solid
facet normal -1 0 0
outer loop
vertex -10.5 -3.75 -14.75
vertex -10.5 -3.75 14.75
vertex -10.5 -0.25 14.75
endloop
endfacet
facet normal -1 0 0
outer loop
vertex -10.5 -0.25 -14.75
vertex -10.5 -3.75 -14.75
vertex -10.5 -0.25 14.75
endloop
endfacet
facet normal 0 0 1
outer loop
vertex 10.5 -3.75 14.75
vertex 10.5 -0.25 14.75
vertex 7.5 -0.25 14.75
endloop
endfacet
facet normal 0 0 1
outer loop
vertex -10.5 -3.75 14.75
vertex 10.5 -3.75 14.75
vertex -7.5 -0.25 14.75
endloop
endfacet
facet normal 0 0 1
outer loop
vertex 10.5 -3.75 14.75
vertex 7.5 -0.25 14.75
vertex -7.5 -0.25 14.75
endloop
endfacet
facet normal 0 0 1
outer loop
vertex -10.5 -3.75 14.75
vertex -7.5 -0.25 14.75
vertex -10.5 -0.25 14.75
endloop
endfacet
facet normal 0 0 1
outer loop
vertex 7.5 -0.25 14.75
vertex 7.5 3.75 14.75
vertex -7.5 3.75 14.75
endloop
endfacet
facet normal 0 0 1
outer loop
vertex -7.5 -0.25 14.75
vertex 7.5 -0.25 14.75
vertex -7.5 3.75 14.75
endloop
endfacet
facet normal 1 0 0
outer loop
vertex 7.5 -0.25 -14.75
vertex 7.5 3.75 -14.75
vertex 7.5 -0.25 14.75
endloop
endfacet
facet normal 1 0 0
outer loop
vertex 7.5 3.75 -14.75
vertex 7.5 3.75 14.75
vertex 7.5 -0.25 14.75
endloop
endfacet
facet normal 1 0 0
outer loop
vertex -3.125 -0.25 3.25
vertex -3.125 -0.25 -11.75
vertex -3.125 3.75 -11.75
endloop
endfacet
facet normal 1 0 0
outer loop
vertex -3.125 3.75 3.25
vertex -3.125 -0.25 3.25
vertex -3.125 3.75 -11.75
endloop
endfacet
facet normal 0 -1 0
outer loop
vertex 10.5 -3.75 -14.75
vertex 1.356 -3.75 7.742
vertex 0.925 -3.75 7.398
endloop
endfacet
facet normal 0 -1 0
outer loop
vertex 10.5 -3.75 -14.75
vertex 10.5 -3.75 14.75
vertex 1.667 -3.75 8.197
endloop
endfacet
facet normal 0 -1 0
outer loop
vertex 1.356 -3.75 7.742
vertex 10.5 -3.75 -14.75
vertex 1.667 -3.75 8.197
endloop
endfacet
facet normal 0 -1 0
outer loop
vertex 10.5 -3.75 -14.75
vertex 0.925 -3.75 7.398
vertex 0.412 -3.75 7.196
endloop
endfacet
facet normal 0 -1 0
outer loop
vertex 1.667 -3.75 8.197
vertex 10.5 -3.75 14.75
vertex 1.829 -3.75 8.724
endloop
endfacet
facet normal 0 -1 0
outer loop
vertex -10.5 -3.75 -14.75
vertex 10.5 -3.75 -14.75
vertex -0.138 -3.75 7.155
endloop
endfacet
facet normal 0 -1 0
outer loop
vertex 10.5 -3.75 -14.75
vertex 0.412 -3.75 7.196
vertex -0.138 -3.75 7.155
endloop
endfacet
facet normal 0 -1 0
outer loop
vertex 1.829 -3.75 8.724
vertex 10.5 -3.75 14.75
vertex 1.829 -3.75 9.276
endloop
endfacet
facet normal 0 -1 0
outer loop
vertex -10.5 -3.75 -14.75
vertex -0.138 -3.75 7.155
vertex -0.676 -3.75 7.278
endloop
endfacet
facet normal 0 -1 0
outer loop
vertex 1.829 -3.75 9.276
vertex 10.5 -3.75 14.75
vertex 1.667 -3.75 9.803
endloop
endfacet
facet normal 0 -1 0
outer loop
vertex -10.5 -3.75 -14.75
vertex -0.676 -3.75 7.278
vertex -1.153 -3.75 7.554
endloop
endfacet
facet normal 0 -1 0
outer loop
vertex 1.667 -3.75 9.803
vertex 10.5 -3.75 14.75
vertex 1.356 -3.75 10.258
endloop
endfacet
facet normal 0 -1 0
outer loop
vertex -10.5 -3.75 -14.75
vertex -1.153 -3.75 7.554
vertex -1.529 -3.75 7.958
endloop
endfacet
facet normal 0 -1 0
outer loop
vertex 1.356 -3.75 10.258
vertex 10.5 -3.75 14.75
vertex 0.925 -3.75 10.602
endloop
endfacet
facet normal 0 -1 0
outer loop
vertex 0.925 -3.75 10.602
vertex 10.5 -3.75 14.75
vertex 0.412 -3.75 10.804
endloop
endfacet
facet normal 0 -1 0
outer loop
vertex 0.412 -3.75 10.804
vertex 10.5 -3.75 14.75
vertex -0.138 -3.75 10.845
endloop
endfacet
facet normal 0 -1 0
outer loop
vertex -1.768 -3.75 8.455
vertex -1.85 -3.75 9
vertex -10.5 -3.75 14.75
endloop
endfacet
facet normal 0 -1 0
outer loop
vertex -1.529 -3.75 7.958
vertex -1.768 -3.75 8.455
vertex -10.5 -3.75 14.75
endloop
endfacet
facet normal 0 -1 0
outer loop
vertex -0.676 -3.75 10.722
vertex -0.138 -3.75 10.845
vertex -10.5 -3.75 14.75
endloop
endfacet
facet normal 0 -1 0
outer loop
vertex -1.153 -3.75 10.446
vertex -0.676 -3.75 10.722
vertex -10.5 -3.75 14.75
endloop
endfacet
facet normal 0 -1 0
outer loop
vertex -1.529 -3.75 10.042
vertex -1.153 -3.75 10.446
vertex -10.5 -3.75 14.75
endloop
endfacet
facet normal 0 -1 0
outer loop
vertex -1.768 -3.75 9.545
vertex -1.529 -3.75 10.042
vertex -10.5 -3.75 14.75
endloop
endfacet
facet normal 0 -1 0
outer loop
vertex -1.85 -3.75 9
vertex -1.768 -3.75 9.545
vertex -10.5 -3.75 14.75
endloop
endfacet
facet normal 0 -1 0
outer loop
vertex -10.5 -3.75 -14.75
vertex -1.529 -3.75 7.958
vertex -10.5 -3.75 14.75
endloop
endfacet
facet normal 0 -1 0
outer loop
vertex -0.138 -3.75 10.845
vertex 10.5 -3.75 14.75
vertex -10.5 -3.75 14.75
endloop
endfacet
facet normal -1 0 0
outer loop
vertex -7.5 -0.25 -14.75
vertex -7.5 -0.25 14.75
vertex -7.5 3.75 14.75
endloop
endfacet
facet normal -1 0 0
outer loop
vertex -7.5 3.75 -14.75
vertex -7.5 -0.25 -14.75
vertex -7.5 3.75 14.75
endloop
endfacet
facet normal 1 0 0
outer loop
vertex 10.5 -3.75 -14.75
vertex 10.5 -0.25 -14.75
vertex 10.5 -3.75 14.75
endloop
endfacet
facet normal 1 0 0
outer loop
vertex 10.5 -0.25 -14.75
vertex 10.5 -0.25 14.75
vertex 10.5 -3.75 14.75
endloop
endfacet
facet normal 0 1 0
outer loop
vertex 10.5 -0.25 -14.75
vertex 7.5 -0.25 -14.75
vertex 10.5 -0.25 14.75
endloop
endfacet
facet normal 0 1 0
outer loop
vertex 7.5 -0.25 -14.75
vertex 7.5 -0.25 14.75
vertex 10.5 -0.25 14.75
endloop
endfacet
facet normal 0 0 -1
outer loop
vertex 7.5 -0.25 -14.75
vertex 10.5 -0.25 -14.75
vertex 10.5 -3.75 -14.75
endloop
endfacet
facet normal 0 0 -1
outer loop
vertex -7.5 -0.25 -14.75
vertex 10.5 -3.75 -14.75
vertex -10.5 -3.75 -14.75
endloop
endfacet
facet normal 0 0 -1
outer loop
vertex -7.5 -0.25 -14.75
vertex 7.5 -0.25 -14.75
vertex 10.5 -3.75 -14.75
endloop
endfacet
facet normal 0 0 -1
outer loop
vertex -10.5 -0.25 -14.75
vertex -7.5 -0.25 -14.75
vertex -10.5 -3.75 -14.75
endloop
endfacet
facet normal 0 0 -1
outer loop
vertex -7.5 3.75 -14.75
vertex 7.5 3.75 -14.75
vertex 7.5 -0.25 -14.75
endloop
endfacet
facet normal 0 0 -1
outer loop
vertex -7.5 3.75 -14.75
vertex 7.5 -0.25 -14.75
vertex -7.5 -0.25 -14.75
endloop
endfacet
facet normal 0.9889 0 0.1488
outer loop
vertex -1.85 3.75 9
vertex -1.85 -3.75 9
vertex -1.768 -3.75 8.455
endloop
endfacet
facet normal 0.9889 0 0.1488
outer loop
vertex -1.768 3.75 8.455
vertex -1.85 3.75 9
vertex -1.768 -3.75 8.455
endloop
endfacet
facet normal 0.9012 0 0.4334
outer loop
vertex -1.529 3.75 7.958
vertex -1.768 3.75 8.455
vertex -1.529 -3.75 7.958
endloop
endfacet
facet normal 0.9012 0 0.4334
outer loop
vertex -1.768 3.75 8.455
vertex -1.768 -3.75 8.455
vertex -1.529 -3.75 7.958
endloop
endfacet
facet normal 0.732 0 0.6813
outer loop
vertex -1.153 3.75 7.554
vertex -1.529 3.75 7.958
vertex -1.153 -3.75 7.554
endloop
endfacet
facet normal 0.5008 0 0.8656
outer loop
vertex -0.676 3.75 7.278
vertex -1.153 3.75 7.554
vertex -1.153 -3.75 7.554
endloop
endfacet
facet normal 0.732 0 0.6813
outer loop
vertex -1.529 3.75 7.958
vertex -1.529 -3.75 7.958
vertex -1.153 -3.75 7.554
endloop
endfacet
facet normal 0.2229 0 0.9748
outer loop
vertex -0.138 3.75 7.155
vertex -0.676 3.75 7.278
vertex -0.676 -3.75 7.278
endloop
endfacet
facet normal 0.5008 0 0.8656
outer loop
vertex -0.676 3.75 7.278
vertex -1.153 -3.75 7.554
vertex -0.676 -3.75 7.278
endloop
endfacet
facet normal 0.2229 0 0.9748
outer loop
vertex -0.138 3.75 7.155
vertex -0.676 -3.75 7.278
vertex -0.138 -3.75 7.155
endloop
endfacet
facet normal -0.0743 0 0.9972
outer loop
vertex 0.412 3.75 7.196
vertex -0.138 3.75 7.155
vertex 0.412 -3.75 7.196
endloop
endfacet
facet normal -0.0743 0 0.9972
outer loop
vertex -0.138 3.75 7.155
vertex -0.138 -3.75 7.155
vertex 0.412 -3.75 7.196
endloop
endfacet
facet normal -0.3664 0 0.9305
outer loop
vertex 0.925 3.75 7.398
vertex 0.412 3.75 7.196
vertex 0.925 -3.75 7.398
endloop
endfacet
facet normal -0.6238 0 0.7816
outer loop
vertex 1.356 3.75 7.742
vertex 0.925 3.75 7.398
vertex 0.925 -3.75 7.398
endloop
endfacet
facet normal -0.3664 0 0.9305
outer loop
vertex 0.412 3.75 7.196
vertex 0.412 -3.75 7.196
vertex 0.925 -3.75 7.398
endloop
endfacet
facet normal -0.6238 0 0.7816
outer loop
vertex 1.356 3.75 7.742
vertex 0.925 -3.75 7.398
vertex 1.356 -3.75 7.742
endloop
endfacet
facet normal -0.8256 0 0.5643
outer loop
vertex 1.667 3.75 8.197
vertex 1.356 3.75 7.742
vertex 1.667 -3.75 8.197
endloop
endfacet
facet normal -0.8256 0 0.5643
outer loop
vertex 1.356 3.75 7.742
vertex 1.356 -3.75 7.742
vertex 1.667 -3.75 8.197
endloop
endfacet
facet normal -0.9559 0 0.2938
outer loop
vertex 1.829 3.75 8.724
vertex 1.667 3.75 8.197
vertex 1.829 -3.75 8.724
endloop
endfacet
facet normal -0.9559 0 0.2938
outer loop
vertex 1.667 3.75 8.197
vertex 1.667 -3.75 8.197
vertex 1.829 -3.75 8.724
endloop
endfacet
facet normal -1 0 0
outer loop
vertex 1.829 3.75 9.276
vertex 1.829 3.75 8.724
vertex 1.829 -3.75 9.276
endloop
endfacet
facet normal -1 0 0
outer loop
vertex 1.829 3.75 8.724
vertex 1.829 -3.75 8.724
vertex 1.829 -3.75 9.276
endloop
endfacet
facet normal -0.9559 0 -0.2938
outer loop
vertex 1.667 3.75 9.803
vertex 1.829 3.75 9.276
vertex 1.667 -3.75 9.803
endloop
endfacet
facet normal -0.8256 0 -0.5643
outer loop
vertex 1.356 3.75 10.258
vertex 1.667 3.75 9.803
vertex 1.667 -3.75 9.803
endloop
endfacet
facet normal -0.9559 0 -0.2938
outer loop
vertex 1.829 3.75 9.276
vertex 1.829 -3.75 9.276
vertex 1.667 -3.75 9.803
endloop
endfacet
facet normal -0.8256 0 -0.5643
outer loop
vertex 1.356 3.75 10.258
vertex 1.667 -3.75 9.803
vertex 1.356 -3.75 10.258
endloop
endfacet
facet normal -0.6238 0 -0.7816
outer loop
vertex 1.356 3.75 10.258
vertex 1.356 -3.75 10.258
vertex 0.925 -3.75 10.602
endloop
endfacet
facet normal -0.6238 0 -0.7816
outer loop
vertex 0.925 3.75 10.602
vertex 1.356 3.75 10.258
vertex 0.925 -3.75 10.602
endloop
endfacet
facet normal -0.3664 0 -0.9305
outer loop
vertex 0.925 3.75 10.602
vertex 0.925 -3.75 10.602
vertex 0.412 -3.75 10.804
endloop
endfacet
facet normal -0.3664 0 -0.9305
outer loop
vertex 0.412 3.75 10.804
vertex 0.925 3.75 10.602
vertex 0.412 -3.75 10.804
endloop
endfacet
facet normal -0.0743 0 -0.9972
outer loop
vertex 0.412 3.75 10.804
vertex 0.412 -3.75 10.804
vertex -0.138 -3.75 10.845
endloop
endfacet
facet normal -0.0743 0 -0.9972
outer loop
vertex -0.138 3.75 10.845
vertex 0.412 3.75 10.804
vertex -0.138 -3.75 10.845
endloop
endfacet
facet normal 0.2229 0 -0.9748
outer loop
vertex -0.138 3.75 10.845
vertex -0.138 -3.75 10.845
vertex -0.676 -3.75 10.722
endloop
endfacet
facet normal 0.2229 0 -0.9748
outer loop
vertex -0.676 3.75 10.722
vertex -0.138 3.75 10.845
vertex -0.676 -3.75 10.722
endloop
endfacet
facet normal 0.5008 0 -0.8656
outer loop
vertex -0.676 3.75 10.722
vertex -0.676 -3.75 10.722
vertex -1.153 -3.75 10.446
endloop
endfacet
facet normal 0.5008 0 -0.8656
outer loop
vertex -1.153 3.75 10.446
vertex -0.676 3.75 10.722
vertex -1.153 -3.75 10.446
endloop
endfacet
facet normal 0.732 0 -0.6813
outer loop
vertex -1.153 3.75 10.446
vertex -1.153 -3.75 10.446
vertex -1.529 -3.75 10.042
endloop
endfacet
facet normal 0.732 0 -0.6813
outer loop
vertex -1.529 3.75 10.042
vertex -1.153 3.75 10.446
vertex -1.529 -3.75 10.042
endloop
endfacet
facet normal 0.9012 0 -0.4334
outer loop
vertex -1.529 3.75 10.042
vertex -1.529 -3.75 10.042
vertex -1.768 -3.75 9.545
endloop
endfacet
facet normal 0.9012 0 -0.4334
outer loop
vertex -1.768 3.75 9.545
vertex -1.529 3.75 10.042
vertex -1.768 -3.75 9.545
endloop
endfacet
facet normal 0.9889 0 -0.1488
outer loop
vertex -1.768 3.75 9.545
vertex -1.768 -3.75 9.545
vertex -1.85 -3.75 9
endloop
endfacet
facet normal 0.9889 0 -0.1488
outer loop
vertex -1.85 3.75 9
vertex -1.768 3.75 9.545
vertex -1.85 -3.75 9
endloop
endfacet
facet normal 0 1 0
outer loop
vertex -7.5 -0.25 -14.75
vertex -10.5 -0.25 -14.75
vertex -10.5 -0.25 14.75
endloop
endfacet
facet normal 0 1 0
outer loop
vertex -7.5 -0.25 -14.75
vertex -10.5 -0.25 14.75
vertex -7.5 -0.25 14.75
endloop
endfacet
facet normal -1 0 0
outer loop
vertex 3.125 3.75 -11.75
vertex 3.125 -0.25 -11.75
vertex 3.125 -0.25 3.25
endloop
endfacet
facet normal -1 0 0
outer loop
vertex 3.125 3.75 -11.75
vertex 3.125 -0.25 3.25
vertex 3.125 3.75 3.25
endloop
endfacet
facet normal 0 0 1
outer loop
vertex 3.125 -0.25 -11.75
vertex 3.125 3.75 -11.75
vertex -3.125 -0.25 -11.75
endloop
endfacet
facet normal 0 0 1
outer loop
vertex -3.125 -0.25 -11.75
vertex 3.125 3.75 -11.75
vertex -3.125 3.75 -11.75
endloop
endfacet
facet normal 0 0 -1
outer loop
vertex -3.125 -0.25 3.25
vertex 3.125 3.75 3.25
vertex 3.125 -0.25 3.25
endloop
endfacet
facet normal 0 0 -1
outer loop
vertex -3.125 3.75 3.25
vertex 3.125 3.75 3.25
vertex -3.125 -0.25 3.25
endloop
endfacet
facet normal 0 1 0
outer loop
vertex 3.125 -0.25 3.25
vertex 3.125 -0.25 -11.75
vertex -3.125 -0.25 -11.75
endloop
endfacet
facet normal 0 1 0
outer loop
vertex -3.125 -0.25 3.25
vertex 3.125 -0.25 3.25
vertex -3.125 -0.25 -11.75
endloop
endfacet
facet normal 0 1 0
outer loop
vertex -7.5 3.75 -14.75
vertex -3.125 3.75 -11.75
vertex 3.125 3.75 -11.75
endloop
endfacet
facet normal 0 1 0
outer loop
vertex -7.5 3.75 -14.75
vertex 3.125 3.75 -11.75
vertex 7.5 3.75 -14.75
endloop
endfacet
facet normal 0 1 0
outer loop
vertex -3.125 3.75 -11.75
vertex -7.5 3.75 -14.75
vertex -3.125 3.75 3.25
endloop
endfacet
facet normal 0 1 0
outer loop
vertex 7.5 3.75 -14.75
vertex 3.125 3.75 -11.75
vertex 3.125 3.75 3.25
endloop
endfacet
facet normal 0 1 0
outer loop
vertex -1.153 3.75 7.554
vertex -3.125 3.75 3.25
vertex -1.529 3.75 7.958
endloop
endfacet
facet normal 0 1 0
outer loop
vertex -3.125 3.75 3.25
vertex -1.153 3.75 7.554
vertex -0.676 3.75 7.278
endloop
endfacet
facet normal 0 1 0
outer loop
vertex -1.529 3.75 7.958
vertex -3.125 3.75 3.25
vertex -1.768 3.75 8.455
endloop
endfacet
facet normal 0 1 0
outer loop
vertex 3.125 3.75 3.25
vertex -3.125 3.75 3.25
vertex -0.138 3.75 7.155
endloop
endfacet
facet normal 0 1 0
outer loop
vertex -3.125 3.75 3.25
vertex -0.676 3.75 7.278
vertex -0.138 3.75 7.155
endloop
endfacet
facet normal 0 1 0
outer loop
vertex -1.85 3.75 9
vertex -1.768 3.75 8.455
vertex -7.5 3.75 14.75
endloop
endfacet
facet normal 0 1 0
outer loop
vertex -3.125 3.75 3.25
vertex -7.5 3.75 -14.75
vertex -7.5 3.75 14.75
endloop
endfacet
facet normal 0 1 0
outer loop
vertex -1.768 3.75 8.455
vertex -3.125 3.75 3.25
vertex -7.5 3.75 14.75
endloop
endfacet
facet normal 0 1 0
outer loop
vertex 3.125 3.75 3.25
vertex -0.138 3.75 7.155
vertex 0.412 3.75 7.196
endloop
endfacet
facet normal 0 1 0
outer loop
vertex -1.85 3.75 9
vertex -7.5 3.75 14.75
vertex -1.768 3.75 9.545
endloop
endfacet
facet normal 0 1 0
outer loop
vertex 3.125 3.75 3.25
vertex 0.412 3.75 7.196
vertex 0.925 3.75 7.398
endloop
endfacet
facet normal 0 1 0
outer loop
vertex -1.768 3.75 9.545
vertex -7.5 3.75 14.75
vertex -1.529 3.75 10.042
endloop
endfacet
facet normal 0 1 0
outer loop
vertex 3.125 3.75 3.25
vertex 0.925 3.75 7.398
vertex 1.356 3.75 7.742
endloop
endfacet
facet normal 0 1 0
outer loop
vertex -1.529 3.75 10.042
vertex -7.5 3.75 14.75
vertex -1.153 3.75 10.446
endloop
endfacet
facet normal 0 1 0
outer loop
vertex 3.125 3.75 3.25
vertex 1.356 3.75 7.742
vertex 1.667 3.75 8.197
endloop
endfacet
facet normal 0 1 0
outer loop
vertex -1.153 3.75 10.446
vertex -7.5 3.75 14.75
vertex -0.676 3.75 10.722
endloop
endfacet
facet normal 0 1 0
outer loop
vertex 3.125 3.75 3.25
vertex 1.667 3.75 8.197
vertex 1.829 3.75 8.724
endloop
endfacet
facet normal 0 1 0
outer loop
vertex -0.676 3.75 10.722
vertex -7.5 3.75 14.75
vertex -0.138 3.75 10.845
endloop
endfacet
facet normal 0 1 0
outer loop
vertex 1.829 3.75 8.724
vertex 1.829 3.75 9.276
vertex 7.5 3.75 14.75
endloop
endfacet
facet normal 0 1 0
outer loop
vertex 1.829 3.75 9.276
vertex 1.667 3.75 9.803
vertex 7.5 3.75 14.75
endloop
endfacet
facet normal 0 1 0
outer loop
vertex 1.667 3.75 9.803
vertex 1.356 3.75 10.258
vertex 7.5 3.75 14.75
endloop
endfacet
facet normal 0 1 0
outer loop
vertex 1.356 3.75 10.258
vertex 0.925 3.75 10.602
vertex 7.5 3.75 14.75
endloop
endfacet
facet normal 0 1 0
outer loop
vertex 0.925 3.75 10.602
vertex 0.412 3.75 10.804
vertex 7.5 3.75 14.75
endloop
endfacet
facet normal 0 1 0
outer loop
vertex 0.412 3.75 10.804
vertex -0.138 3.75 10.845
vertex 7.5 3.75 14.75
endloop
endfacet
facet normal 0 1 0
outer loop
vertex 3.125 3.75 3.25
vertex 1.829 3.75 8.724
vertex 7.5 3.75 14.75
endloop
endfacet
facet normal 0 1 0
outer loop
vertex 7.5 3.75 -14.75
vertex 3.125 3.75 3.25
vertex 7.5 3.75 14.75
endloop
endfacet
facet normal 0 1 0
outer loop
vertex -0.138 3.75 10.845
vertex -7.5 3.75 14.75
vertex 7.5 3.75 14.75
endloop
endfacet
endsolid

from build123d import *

# Parameters (mm, degrees)
BOSS_EXTRUDE1_DEPTH        = 14.75
SKETCH3_W                  = 6.25
SKETCH3_H                  = 4
CUT_EXTRUDE1_DEPTH         = 15
F_3_7_3_7_DIAMETER_HOLE1_D = 3.7


with BuildPart() as part:
    # Sketch1 → Boss-Extrude1 (new, symmetric)
    with BuildSketch(Plane.XY):
        Polygon((-7.5, -0.25), (-7.5, 3.75), (7.5, 3.75), (7.5, -0.25), (10.5, -0.25), (10.5, -3.75), (-10.5, -3.75), (-10.5, -0.25), align=None)
    extrude(amount=BOSS_EXTRUDE1_DEPTH, both=True)

    # Sketch3 → Cut-Extrude1 (cut)
    with BuildSketch(Plane(origin=(0, 0, -11.75), x_dir=(-1, 0, 0), z_dir=(0, 0, -1))):
        with Locations((0, 1.75)):
            Rectangle(SKETCH3_W, SKETCH3_H)
    extrude(amount=-CUT_EXTRUDE1_DEPTH, mode=Mode.SUBTRACT)

    # Ø3.7 (3.7) Diameter Hole1 (through all)
    with Locations(Plane(origin=(0, 3.75, 0), x_dir=(1, 0, 0), z_dir=(0, 1, 0))):
        with Locations((0, -9)):
            Hole(F_3_7_3_7_DIAMETER_HOLE1_D / 2)


solid = part.part
